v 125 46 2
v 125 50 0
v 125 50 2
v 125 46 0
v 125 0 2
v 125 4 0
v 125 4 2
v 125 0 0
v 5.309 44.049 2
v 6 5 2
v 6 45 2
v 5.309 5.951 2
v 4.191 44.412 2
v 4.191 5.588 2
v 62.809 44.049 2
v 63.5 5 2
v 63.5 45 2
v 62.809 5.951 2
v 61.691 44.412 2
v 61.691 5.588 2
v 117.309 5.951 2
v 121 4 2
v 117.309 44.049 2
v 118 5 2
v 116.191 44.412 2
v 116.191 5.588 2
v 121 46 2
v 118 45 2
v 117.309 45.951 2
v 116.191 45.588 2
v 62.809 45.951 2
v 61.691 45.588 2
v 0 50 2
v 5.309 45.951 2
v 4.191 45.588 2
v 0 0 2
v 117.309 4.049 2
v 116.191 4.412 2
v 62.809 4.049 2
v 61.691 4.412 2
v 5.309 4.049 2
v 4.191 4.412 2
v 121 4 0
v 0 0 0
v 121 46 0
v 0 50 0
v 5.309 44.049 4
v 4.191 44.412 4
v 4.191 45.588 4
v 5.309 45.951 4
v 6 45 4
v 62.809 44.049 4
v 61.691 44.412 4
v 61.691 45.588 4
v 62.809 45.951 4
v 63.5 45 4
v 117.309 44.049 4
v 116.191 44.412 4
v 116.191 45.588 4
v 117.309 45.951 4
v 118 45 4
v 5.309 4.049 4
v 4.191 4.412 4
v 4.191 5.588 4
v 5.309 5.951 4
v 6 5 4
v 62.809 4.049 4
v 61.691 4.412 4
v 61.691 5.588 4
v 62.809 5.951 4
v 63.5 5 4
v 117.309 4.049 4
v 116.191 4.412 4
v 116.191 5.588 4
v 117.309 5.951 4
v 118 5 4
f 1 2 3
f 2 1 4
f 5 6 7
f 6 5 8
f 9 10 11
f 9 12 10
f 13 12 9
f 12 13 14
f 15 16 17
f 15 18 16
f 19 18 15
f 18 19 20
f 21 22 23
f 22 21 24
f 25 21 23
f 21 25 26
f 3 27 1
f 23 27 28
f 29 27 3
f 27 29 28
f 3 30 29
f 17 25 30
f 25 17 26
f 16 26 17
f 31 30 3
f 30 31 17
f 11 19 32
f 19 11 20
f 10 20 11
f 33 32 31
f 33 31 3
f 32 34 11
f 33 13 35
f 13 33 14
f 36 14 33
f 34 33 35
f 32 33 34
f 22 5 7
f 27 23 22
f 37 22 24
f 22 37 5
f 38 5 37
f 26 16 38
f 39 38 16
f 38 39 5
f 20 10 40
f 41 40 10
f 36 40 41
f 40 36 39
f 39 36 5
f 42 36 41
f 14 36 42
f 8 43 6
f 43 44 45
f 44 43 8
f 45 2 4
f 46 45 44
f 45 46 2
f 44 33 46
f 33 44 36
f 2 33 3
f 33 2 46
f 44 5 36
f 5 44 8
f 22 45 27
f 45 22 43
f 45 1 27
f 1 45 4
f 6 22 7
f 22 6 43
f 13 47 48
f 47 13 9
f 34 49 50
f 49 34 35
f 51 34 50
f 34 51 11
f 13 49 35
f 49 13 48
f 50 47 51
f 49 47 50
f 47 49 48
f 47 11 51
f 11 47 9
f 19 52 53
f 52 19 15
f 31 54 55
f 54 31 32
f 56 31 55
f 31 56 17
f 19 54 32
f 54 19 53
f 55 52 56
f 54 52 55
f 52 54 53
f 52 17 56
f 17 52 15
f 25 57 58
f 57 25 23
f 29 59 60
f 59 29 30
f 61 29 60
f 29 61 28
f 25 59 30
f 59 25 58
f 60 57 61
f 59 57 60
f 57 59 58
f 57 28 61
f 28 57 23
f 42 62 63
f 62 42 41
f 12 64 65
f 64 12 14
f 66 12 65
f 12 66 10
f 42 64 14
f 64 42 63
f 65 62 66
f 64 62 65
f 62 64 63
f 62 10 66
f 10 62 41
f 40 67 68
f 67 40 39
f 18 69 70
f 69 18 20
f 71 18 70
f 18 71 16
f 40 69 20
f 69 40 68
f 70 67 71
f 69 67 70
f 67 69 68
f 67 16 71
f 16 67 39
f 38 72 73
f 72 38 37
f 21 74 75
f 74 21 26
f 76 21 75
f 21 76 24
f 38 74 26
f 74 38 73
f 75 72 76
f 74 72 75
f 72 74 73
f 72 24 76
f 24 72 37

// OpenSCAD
// file: measurements.scad
tower_y = 50;
tower_z = 125;
wall_thickness = 2;

leg_height = 4;
leg_width = 4;

connector_r = 1;
connector_height = 2;
connector_y_positions = [tower_y - wall_thickness - connector_r - 2, 5];
connector_x_positions = [5, tower_z / 2, tower_z - leg_height - 4];
// main file
// Matthew Birky
// 4/9/2018

include <measurements.scad>

difference() {
    cube([tower_z, tower_y, wall_thickness]);

    // The + 1 is to prevent clipping issues
    translate([tower_z - leg_height, leg_width, 0]) cube([leg_height + 1, tower_y - 2 * leg_width, wall_thickness + 1]);
}

for(pos_y = connector_y_positions) {
    for(pos_x = connector_x_positions) {
        translate([pos_x, pos_y, wall_thickness]) {
            cylinder(connector_height, connector_r, connector_r);
        }
    }
}
